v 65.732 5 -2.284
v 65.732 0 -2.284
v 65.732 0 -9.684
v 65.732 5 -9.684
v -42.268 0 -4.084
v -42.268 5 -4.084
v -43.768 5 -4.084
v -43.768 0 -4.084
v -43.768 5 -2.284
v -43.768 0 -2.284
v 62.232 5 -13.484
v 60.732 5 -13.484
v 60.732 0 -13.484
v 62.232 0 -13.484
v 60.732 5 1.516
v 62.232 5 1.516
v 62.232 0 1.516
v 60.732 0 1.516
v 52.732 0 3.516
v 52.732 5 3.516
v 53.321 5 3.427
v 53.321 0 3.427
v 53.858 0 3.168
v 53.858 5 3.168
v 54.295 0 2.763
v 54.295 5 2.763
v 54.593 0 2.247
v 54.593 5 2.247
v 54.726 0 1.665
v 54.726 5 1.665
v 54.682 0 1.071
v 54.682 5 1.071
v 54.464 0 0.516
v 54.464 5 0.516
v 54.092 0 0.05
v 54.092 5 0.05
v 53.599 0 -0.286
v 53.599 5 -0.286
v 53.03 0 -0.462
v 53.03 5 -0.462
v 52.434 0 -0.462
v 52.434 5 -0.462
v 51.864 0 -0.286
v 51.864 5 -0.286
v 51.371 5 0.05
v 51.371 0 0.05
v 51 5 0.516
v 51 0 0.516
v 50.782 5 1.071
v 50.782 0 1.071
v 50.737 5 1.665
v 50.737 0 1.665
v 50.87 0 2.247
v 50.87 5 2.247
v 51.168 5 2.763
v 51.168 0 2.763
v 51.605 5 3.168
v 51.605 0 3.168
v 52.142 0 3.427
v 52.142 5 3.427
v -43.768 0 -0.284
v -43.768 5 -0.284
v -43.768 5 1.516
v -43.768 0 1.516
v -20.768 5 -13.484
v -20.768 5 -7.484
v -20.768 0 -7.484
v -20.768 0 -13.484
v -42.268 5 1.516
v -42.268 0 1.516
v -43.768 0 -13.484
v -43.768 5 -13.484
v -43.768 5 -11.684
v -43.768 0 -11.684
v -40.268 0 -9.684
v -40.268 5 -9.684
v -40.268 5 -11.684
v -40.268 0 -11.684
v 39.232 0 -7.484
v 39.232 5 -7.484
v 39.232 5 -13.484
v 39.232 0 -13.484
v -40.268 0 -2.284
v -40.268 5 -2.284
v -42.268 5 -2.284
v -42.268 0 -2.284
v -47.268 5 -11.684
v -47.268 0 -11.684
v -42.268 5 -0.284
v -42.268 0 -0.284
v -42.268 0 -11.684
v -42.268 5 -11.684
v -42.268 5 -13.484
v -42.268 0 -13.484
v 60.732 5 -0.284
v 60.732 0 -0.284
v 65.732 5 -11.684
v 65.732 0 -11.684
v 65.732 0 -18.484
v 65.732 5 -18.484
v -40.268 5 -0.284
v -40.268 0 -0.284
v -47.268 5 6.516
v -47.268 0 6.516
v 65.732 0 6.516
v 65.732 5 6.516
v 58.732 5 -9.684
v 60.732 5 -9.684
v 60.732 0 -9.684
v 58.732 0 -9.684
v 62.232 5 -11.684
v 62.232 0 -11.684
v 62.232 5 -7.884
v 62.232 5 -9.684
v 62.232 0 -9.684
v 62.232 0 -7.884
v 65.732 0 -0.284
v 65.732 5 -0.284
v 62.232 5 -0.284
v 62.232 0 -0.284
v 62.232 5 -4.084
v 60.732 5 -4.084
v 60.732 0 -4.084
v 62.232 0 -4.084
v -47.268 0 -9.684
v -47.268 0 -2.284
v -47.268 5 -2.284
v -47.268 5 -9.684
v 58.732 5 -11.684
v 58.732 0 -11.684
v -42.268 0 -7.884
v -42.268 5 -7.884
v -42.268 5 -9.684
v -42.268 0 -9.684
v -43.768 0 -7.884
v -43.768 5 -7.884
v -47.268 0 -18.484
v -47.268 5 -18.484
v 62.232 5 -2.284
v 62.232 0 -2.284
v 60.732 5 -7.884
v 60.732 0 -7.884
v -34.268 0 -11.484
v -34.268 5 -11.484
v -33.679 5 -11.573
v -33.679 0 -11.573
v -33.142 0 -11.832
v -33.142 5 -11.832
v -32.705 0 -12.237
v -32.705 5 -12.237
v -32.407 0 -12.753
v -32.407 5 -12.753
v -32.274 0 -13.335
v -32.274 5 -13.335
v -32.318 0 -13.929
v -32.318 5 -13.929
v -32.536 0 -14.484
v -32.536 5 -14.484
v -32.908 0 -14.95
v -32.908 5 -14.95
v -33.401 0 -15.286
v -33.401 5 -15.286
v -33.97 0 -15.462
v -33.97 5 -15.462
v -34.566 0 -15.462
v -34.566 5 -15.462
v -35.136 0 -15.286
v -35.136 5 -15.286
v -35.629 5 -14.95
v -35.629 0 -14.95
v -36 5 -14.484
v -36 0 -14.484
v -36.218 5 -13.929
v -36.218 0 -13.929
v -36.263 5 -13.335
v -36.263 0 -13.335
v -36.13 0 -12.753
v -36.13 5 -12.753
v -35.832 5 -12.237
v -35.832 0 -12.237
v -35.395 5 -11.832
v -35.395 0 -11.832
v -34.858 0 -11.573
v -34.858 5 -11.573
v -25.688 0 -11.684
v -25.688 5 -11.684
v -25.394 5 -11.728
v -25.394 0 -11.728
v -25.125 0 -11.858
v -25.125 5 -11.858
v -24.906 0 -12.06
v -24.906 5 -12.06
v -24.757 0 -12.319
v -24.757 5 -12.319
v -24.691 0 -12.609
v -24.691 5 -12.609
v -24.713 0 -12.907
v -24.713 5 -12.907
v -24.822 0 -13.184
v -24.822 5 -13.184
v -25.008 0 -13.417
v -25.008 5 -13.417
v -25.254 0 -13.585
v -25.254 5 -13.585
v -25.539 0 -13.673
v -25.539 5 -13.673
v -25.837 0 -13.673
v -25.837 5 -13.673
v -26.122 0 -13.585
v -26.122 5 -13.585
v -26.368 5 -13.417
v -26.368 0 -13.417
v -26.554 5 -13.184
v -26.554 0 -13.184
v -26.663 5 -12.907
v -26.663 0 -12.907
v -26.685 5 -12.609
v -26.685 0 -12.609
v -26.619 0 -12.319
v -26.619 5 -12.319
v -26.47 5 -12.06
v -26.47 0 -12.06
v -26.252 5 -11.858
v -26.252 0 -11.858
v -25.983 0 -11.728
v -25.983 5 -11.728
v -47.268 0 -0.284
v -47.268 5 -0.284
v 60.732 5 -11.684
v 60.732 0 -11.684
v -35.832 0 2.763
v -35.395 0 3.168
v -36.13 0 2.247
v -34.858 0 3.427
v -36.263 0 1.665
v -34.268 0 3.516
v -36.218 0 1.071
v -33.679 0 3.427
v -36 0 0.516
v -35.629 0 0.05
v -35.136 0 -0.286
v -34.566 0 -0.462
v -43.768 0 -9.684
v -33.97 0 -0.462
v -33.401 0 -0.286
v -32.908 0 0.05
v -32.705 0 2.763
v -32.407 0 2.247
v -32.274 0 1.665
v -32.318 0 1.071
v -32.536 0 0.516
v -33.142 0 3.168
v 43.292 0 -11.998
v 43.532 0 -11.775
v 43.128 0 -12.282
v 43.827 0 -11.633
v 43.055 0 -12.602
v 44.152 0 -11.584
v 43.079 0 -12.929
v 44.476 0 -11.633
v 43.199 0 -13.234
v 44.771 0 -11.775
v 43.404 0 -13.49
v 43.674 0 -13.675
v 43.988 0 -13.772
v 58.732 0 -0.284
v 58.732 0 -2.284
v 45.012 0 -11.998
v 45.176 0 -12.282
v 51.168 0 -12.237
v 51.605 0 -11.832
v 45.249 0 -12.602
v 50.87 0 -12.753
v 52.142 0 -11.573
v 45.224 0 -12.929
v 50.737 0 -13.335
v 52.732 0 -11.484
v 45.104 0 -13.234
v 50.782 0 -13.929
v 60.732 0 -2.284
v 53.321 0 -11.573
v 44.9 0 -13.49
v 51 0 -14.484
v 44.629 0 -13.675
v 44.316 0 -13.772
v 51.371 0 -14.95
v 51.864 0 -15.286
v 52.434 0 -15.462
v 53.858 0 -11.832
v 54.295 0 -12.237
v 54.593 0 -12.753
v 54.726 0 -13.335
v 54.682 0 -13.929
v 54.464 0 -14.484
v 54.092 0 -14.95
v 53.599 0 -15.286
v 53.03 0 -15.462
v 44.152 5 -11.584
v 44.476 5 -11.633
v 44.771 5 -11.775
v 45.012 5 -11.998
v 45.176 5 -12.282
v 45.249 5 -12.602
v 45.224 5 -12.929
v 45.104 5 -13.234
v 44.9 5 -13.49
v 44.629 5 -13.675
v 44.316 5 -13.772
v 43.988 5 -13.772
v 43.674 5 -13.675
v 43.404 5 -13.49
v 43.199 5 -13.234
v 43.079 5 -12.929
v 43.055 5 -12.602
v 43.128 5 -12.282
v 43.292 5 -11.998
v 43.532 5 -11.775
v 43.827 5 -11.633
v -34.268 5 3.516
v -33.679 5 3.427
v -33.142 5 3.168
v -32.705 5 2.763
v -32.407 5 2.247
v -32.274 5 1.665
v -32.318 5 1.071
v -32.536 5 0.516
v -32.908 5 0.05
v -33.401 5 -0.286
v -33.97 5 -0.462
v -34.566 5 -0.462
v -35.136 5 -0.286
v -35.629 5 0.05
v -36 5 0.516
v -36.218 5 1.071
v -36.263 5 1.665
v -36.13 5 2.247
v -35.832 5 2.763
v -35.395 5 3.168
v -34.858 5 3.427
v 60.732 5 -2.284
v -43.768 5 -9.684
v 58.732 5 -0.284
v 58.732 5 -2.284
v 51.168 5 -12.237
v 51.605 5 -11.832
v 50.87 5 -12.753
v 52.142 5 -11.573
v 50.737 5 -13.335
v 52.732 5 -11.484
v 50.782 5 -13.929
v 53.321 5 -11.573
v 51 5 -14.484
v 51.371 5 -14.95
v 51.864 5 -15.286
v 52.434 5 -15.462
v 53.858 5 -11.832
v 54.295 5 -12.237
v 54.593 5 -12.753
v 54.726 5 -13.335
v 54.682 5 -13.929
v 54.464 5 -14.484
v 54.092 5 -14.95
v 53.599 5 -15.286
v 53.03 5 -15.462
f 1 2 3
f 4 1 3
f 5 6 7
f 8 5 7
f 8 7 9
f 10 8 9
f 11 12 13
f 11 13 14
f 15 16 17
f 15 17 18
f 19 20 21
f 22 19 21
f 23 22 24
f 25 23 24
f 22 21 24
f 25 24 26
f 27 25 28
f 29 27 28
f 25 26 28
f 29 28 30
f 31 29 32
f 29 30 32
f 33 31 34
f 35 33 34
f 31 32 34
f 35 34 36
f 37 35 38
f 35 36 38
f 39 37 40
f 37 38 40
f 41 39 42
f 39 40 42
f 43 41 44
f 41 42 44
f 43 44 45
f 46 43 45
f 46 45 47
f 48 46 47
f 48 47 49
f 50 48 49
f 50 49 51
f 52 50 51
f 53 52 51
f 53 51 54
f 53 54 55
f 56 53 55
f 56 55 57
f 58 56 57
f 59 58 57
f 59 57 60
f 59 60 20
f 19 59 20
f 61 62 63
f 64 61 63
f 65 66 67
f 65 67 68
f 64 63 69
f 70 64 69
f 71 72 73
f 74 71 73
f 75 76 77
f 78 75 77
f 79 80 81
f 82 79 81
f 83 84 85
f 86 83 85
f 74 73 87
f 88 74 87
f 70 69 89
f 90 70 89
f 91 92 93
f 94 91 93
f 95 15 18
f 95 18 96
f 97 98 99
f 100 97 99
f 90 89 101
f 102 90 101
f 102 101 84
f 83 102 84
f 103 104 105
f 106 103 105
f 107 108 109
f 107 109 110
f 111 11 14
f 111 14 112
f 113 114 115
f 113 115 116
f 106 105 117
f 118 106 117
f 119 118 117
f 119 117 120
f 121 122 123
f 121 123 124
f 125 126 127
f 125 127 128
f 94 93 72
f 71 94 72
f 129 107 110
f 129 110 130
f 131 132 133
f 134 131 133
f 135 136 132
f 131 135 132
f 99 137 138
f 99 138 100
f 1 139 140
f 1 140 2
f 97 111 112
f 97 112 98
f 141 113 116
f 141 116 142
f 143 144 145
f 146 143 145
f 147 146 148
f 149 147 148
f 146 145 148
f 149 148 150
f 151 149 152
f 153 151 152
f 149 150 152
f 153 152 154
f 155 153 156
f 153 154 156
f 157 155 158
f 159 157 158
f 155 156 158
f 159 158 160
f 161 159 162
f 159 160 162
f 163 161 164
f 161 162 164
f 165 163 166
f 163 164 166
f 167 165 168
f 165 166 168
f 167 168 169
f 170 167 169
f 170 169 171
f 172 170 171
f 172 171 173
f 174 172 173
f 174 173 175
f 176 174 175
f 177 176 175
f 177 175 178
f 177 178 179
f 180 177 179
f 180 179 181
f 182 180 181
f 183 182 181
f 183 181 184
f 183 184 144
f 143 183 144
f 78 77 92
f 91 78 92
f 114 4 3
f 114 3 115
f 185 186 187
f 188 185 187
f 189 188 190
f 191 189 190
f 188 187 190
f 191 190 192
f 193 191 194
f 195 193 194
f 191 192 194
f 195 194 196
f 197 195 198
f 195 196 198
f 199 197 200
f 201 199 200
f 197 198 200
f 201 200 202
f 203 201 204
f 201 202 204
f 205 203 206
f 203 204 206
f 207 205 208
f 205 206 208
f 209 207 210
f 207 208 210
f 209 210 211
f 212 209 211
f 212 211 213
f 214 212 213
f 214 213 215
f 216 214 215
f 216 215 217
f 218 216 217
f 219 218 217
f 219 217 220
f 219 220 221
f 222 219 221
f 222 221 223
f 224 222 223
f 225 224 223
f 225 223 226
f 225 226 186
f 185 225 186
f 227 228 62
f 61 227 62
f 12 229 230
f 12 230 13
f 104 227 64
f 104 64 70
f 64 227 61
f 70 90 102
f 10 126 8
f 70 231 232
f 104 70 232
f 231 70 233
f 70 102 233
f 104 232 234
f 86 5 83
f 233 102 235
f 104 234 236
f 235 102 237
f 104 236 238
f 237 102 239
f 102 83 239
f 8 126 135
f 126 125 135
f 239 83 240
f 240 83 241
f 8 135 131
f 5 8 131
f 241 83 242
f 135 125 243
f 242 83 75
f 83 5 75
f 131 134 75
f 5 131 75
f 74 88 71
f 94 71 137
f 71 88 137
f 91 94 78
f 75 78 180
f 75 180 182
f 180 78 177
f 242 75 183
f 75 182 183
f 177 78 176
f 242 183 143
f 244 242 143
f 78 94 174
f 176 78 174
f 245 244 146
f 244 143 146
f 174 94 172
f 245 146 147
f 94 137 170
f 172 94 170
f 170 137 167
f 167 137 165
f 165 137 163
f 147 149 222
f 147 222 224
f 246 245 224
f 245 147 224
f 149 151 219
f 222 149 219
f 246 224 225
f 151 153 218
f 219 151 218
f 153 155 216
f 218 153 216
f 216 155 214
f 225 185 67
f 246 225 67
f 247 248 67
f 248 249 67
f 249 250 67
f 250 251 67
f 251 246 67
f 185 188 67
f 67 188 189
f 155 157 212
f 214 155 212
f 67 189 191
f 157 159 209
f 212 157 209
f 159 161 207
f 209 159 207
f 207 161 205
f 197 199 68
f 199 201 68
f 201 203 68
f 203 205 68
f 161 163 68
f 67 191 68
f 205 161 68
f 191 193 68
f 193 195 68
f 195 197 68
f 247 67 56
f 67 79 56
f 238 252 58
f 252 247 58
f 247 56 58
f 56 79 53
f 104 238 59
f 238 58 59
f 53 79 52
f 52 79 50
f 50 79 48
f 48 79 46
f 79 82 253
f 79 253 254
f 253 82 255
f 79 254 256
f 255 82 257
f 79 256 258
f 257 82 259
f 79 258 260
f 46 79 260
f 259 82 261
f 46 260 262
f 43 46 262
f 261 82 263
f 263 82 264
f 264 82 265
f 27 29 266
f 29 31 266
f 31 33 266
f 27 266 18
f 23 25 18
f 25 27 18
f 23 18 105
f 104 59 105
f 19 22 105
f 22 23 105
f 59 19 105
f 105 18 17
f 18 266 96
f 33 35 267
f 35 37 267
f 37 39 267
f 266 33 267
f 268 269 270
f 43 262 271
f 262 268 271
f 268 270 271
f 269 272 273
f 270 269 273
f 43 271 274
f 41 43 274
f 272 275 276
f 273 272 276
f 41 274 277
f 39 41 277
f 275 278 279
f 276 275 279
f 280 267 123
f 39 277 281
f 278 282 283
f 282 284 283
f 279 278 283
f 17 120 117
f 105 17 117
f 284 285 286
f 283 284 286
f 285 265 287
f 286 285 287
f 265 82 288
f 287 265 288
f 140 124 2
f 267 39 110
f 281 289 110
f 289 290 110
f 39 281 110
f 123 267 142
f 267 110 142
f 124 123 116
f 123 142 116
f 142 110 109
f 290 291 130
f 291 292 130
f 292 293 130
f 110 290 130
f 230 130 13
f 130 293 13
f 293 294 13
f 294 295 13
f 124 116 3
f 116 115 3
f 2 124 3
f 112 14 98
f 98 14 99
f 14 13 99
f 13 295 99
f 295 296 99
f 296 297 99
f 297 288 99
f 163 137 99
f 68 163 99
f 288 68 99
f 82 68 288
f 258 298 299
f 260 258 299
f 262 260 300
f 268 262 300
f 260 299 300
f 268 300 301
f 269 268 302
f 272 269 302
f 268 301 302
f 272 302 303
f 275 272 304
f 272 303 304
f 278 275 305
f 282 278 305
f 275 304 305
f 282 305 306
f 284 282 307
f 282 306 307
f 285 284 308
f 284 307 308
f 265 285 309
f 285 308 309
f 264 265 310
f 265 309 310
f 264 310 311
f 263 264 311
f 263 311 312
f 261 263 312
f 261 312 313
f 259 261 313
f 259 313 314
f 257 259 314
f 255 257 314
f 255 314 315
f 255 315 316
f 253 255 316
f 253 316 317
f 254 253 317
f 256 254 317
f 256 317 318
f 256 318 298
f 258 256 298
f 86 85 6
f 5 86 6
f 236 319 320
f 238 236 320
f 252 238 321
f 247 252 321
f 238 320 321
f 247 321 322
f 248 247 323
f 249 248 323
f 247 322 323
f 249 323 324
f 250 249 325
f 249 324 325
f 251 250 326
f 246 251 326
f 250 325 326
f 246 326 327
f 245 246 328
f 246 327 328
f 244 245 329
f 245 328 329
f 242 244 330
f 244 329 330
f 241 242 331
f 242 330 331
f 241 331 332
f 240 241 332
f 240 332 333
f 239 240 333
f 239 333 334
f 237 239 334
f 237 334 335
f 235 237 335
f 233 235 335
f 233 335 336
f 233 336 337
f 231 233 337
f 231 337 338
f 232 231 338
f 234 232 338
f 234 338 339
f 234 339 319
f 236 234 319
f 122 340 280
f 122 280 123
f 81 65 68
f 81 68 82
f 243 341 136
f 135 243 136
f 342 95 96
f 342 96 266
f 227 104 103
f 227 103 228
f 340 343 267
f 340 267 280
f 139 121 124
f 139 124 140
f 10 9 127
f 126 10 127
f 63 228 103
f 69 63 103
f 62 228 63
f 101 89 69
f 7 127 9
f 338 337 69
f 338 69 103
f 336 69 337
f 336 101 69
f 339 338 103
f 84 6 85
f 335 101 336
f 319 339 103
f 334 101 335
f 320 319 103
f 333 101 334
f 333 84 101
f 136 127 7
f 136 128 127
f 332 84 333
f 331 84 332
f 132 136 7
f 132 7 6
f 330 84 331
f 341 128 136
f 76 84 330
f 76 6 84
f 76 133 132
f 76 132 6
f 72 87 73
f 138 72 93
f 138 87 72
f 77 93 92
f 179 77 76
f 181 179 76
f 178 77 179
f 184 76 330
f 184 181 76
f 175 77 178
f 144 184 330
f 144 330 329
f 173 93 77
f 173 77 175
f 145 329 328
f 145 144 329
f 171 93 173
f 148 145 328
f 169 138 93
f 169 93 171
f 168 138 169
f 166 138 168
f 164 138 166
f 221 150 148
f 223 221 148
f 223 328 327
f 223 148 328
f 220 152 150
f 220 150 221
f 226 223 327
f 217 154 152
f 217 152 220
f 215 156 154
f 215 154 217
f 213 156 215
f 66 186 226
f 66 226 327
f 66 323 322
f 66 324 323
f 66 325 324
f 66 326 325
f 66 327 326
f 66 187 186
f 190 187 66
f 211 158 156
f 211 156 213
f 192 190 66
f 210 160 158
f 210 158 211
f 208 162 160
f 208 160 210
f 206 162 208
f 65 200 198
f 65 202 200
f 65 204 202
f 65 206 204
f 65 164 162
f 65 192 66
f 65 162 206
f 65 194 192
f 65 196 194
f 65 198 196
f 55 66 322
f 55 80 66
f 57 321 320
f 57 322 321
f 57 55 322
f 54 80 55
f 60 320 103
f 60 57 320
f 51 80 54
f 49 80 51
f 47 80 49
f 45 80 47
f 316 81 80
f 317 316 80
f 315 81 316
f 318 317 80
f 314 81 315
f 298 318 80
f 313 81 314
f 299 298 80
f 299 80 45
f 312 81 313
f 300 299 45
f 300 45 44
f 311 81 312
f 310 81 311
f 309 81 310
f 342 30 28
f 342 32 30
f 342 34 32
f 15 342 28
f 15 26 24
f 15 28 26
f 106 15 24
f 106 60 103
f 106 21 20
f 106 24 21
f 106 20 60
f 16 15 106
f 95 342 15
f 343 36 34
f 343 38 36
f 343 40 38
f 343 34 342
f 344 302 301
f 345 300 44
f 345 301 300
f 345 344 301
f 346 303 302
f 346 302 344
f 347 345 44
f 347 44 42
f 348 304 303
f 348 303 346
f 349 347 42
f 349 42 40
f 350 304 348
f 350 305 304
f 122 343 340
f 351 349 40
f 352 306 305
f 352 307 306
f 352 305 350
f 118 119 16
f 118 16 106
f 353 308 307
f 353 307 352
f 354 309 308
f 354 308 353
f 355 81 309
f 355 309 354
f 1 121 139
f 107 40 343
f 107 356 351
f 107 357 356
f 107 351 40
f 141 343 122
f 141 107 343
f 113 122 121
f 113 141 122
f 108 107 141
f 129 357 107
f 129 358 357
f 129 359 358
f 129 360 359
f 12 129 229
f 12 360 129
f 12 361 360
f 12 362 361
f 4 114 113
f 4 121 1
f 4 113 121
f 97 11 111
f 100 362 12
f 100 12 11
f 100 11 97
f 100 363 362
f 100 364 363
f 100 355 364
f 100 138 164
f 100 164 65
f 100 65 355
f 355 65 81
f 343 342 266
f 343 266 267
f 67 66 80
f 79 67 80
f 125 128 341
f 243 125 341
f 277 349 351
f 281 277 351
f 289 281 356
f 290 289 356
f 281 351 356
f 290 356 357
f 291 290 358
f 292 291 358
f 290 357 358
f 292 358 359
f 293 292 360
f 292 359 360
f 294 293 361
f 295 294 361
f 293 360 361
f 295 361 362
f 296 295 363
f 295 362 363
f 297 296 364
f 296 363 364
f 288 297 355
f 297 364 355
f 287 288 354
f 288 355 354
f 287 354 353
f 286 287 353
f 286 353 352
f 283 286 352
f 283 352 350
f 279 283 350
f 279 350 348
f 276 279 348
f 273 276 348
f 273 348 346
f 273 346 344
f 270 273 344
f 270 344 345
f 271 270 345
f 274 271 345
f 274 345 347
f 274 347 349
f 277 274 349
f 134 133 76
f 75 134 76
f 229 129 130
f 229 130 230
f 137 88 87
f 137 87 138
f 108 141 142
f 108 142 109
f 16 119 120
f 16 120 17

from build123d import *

# Parameters (mm, degrees)
ESBO_O1_W                = 113
ESBO_O1_H                = 25
RESSALTO_EXTRUS_O1_DEPTH = 5
CORTE_EXTRUS_O1_DEPTH    = 5
ESBO_O4_R                = 1
ESBO_O4_R_2              = 1.1
CORTE_EXTRUS_O2_DEPTH    = 76
ESBO_O5_R                = 2
CORTE_EXTRUS_O3_DEPTH    = 10
ESBO_O6_W                = 30
ESBO_O6_H                = 6
CORTE_EXTRUS_O4_DEPTH    = 10


with BuildPart() as part:
    # Esboço1 → Ressalto-extrusão1 (new body)
    with BuildSketch(Plane(origin=(0, 0, 0), x_dir=(1, 0, 0), z_dir=(0, 1, 0))):
        with Locations((9.231716451, 5.983979594)):
            Rectangle(ESBO_O1_W, ESBO_O1_H)
    extrude(amount=RESSALTO_EXTRUS_O1_DEPTH)

    # Esboço2 → Corte-extrusão1 (cut)
    with BuildSketch(Plane(origin=(0, 5, 0), x_dir=(1, 0, 0), z_dir=(0, 1, 0))):
        Polygon((65.731716451, 0.283979594), (62.231716451, 0.283979594), (62.231716451, -1.516020406), (60.731716451, -1.516020406), (60.731716451, 0.283979594), (58.731716451, 0.283979594), (58.731716451, 2.283979594), (60.731716451, 2.283979594), (60.731716451, 4.083979594), (62.231716451, 4.083979594), (62.231716451, 2.283979594), (65.731716451, 2.283979594), align=None)
        Polygon((65.731716451, 9.683979594), (62.231716451, 9.683979594), (62.231716451, 7.883979594), (60.731716451, 7.883979594), (60.731716451, 9.683979594), (58.731716451, 9.683979594), (58.731716451, 11.683979594), (60.731716451, 11.683979594), (60.731716451, 13.483979594), (62.231716451, 13.483979594), (62.231716451, 11.683979594), (65.731716451, 11.683979594), align=None)
    corte_extrus_o1 = extrude(amount=-CORTE_EXTRUS_O1_DEPTH, mode=Mode.SUBTRACT)

    # Esboço4 → Corte-extrusão2 (cut)
    with BuildSketch(Plane(origin=(0, 5, 0), x_dir=(1, 0, 0), z_dir=(0, 1, 0))):
        with Locations(Location((-25.688283549, 12.683979594, 0), (0, 0, 270))):
            Circle(ESBO_O4_R)
        with Locations(Location((44.151716451, 12.683979594, 0), (0, 0, 270))):
            Circle(ESBO_O4_R_2)
    extrude(amount=-CORTE_EXTRUS_O2_DEPTH, mode=Mode.SUBTRACT)

    # Esboço5 → Corte-extrusão3 (cut)
    with BuildSketch(Plane(origin=(0, 5, 0), x_dir=(1, 0, 0), z_dir=(0, 1, 0))):
        with Locations(Location((-34.268283549, 13.483979594, 0), (0, 0, 270))):
            Circle(ESBO_O5_R)
        with Locations(Location((-34.268283549, -1.516020406, 0), (0, 0, 270))):
            Circle(ESBO_O5_R)
        with Locations(Location((52.731716451, 13.483979594, 0), (0, 0, 270))):
            Circle(ESBO_O5_R)
        with Locations(Location((52.731716451, -1.516020406, 0), (0, 0, 270))):
            Circle(ESBO_O5_R)
    extrude(amount=-CORTE_EXTRUS_O3_DEPTH, mode=Mode.SUBTRACT)

    # Esboço6 → Corte-extrusão4 (cut)
    with BuildSketch(Plane(origin=(0, 5, 0), x_dir=(1, 0, 0), z_dir=(0, 1, 0))):
        with Locations((24.231716451, 10.483979594)):
            Rectangle(ESBO_O6_W, ESBO_O6_H)
    corte_extrus_o4 = extrude(amount=-CORTE_EXTRUS_O4_DEPTH, mode=Mode.SUBTRACT)

    # Espelhar1: Corte-extrusão1, Corte-extrusão4 across plane
    add(corte_extrus_o1.mirror(Plane(origin=(9.231716451, 0, 0), x_dir=(0, 0, 1), z_dir=(1, 0, 0))), mode=Mode.SUBTRACT)
    add(corte_extrus_o4.mirror(Plane(origin=(9.231716451, 0, 0), x_dir=(0, 0, 1), z_dir=(1, 0, 0))), mode=Mode.SUBTRACT)


solid = part.part
